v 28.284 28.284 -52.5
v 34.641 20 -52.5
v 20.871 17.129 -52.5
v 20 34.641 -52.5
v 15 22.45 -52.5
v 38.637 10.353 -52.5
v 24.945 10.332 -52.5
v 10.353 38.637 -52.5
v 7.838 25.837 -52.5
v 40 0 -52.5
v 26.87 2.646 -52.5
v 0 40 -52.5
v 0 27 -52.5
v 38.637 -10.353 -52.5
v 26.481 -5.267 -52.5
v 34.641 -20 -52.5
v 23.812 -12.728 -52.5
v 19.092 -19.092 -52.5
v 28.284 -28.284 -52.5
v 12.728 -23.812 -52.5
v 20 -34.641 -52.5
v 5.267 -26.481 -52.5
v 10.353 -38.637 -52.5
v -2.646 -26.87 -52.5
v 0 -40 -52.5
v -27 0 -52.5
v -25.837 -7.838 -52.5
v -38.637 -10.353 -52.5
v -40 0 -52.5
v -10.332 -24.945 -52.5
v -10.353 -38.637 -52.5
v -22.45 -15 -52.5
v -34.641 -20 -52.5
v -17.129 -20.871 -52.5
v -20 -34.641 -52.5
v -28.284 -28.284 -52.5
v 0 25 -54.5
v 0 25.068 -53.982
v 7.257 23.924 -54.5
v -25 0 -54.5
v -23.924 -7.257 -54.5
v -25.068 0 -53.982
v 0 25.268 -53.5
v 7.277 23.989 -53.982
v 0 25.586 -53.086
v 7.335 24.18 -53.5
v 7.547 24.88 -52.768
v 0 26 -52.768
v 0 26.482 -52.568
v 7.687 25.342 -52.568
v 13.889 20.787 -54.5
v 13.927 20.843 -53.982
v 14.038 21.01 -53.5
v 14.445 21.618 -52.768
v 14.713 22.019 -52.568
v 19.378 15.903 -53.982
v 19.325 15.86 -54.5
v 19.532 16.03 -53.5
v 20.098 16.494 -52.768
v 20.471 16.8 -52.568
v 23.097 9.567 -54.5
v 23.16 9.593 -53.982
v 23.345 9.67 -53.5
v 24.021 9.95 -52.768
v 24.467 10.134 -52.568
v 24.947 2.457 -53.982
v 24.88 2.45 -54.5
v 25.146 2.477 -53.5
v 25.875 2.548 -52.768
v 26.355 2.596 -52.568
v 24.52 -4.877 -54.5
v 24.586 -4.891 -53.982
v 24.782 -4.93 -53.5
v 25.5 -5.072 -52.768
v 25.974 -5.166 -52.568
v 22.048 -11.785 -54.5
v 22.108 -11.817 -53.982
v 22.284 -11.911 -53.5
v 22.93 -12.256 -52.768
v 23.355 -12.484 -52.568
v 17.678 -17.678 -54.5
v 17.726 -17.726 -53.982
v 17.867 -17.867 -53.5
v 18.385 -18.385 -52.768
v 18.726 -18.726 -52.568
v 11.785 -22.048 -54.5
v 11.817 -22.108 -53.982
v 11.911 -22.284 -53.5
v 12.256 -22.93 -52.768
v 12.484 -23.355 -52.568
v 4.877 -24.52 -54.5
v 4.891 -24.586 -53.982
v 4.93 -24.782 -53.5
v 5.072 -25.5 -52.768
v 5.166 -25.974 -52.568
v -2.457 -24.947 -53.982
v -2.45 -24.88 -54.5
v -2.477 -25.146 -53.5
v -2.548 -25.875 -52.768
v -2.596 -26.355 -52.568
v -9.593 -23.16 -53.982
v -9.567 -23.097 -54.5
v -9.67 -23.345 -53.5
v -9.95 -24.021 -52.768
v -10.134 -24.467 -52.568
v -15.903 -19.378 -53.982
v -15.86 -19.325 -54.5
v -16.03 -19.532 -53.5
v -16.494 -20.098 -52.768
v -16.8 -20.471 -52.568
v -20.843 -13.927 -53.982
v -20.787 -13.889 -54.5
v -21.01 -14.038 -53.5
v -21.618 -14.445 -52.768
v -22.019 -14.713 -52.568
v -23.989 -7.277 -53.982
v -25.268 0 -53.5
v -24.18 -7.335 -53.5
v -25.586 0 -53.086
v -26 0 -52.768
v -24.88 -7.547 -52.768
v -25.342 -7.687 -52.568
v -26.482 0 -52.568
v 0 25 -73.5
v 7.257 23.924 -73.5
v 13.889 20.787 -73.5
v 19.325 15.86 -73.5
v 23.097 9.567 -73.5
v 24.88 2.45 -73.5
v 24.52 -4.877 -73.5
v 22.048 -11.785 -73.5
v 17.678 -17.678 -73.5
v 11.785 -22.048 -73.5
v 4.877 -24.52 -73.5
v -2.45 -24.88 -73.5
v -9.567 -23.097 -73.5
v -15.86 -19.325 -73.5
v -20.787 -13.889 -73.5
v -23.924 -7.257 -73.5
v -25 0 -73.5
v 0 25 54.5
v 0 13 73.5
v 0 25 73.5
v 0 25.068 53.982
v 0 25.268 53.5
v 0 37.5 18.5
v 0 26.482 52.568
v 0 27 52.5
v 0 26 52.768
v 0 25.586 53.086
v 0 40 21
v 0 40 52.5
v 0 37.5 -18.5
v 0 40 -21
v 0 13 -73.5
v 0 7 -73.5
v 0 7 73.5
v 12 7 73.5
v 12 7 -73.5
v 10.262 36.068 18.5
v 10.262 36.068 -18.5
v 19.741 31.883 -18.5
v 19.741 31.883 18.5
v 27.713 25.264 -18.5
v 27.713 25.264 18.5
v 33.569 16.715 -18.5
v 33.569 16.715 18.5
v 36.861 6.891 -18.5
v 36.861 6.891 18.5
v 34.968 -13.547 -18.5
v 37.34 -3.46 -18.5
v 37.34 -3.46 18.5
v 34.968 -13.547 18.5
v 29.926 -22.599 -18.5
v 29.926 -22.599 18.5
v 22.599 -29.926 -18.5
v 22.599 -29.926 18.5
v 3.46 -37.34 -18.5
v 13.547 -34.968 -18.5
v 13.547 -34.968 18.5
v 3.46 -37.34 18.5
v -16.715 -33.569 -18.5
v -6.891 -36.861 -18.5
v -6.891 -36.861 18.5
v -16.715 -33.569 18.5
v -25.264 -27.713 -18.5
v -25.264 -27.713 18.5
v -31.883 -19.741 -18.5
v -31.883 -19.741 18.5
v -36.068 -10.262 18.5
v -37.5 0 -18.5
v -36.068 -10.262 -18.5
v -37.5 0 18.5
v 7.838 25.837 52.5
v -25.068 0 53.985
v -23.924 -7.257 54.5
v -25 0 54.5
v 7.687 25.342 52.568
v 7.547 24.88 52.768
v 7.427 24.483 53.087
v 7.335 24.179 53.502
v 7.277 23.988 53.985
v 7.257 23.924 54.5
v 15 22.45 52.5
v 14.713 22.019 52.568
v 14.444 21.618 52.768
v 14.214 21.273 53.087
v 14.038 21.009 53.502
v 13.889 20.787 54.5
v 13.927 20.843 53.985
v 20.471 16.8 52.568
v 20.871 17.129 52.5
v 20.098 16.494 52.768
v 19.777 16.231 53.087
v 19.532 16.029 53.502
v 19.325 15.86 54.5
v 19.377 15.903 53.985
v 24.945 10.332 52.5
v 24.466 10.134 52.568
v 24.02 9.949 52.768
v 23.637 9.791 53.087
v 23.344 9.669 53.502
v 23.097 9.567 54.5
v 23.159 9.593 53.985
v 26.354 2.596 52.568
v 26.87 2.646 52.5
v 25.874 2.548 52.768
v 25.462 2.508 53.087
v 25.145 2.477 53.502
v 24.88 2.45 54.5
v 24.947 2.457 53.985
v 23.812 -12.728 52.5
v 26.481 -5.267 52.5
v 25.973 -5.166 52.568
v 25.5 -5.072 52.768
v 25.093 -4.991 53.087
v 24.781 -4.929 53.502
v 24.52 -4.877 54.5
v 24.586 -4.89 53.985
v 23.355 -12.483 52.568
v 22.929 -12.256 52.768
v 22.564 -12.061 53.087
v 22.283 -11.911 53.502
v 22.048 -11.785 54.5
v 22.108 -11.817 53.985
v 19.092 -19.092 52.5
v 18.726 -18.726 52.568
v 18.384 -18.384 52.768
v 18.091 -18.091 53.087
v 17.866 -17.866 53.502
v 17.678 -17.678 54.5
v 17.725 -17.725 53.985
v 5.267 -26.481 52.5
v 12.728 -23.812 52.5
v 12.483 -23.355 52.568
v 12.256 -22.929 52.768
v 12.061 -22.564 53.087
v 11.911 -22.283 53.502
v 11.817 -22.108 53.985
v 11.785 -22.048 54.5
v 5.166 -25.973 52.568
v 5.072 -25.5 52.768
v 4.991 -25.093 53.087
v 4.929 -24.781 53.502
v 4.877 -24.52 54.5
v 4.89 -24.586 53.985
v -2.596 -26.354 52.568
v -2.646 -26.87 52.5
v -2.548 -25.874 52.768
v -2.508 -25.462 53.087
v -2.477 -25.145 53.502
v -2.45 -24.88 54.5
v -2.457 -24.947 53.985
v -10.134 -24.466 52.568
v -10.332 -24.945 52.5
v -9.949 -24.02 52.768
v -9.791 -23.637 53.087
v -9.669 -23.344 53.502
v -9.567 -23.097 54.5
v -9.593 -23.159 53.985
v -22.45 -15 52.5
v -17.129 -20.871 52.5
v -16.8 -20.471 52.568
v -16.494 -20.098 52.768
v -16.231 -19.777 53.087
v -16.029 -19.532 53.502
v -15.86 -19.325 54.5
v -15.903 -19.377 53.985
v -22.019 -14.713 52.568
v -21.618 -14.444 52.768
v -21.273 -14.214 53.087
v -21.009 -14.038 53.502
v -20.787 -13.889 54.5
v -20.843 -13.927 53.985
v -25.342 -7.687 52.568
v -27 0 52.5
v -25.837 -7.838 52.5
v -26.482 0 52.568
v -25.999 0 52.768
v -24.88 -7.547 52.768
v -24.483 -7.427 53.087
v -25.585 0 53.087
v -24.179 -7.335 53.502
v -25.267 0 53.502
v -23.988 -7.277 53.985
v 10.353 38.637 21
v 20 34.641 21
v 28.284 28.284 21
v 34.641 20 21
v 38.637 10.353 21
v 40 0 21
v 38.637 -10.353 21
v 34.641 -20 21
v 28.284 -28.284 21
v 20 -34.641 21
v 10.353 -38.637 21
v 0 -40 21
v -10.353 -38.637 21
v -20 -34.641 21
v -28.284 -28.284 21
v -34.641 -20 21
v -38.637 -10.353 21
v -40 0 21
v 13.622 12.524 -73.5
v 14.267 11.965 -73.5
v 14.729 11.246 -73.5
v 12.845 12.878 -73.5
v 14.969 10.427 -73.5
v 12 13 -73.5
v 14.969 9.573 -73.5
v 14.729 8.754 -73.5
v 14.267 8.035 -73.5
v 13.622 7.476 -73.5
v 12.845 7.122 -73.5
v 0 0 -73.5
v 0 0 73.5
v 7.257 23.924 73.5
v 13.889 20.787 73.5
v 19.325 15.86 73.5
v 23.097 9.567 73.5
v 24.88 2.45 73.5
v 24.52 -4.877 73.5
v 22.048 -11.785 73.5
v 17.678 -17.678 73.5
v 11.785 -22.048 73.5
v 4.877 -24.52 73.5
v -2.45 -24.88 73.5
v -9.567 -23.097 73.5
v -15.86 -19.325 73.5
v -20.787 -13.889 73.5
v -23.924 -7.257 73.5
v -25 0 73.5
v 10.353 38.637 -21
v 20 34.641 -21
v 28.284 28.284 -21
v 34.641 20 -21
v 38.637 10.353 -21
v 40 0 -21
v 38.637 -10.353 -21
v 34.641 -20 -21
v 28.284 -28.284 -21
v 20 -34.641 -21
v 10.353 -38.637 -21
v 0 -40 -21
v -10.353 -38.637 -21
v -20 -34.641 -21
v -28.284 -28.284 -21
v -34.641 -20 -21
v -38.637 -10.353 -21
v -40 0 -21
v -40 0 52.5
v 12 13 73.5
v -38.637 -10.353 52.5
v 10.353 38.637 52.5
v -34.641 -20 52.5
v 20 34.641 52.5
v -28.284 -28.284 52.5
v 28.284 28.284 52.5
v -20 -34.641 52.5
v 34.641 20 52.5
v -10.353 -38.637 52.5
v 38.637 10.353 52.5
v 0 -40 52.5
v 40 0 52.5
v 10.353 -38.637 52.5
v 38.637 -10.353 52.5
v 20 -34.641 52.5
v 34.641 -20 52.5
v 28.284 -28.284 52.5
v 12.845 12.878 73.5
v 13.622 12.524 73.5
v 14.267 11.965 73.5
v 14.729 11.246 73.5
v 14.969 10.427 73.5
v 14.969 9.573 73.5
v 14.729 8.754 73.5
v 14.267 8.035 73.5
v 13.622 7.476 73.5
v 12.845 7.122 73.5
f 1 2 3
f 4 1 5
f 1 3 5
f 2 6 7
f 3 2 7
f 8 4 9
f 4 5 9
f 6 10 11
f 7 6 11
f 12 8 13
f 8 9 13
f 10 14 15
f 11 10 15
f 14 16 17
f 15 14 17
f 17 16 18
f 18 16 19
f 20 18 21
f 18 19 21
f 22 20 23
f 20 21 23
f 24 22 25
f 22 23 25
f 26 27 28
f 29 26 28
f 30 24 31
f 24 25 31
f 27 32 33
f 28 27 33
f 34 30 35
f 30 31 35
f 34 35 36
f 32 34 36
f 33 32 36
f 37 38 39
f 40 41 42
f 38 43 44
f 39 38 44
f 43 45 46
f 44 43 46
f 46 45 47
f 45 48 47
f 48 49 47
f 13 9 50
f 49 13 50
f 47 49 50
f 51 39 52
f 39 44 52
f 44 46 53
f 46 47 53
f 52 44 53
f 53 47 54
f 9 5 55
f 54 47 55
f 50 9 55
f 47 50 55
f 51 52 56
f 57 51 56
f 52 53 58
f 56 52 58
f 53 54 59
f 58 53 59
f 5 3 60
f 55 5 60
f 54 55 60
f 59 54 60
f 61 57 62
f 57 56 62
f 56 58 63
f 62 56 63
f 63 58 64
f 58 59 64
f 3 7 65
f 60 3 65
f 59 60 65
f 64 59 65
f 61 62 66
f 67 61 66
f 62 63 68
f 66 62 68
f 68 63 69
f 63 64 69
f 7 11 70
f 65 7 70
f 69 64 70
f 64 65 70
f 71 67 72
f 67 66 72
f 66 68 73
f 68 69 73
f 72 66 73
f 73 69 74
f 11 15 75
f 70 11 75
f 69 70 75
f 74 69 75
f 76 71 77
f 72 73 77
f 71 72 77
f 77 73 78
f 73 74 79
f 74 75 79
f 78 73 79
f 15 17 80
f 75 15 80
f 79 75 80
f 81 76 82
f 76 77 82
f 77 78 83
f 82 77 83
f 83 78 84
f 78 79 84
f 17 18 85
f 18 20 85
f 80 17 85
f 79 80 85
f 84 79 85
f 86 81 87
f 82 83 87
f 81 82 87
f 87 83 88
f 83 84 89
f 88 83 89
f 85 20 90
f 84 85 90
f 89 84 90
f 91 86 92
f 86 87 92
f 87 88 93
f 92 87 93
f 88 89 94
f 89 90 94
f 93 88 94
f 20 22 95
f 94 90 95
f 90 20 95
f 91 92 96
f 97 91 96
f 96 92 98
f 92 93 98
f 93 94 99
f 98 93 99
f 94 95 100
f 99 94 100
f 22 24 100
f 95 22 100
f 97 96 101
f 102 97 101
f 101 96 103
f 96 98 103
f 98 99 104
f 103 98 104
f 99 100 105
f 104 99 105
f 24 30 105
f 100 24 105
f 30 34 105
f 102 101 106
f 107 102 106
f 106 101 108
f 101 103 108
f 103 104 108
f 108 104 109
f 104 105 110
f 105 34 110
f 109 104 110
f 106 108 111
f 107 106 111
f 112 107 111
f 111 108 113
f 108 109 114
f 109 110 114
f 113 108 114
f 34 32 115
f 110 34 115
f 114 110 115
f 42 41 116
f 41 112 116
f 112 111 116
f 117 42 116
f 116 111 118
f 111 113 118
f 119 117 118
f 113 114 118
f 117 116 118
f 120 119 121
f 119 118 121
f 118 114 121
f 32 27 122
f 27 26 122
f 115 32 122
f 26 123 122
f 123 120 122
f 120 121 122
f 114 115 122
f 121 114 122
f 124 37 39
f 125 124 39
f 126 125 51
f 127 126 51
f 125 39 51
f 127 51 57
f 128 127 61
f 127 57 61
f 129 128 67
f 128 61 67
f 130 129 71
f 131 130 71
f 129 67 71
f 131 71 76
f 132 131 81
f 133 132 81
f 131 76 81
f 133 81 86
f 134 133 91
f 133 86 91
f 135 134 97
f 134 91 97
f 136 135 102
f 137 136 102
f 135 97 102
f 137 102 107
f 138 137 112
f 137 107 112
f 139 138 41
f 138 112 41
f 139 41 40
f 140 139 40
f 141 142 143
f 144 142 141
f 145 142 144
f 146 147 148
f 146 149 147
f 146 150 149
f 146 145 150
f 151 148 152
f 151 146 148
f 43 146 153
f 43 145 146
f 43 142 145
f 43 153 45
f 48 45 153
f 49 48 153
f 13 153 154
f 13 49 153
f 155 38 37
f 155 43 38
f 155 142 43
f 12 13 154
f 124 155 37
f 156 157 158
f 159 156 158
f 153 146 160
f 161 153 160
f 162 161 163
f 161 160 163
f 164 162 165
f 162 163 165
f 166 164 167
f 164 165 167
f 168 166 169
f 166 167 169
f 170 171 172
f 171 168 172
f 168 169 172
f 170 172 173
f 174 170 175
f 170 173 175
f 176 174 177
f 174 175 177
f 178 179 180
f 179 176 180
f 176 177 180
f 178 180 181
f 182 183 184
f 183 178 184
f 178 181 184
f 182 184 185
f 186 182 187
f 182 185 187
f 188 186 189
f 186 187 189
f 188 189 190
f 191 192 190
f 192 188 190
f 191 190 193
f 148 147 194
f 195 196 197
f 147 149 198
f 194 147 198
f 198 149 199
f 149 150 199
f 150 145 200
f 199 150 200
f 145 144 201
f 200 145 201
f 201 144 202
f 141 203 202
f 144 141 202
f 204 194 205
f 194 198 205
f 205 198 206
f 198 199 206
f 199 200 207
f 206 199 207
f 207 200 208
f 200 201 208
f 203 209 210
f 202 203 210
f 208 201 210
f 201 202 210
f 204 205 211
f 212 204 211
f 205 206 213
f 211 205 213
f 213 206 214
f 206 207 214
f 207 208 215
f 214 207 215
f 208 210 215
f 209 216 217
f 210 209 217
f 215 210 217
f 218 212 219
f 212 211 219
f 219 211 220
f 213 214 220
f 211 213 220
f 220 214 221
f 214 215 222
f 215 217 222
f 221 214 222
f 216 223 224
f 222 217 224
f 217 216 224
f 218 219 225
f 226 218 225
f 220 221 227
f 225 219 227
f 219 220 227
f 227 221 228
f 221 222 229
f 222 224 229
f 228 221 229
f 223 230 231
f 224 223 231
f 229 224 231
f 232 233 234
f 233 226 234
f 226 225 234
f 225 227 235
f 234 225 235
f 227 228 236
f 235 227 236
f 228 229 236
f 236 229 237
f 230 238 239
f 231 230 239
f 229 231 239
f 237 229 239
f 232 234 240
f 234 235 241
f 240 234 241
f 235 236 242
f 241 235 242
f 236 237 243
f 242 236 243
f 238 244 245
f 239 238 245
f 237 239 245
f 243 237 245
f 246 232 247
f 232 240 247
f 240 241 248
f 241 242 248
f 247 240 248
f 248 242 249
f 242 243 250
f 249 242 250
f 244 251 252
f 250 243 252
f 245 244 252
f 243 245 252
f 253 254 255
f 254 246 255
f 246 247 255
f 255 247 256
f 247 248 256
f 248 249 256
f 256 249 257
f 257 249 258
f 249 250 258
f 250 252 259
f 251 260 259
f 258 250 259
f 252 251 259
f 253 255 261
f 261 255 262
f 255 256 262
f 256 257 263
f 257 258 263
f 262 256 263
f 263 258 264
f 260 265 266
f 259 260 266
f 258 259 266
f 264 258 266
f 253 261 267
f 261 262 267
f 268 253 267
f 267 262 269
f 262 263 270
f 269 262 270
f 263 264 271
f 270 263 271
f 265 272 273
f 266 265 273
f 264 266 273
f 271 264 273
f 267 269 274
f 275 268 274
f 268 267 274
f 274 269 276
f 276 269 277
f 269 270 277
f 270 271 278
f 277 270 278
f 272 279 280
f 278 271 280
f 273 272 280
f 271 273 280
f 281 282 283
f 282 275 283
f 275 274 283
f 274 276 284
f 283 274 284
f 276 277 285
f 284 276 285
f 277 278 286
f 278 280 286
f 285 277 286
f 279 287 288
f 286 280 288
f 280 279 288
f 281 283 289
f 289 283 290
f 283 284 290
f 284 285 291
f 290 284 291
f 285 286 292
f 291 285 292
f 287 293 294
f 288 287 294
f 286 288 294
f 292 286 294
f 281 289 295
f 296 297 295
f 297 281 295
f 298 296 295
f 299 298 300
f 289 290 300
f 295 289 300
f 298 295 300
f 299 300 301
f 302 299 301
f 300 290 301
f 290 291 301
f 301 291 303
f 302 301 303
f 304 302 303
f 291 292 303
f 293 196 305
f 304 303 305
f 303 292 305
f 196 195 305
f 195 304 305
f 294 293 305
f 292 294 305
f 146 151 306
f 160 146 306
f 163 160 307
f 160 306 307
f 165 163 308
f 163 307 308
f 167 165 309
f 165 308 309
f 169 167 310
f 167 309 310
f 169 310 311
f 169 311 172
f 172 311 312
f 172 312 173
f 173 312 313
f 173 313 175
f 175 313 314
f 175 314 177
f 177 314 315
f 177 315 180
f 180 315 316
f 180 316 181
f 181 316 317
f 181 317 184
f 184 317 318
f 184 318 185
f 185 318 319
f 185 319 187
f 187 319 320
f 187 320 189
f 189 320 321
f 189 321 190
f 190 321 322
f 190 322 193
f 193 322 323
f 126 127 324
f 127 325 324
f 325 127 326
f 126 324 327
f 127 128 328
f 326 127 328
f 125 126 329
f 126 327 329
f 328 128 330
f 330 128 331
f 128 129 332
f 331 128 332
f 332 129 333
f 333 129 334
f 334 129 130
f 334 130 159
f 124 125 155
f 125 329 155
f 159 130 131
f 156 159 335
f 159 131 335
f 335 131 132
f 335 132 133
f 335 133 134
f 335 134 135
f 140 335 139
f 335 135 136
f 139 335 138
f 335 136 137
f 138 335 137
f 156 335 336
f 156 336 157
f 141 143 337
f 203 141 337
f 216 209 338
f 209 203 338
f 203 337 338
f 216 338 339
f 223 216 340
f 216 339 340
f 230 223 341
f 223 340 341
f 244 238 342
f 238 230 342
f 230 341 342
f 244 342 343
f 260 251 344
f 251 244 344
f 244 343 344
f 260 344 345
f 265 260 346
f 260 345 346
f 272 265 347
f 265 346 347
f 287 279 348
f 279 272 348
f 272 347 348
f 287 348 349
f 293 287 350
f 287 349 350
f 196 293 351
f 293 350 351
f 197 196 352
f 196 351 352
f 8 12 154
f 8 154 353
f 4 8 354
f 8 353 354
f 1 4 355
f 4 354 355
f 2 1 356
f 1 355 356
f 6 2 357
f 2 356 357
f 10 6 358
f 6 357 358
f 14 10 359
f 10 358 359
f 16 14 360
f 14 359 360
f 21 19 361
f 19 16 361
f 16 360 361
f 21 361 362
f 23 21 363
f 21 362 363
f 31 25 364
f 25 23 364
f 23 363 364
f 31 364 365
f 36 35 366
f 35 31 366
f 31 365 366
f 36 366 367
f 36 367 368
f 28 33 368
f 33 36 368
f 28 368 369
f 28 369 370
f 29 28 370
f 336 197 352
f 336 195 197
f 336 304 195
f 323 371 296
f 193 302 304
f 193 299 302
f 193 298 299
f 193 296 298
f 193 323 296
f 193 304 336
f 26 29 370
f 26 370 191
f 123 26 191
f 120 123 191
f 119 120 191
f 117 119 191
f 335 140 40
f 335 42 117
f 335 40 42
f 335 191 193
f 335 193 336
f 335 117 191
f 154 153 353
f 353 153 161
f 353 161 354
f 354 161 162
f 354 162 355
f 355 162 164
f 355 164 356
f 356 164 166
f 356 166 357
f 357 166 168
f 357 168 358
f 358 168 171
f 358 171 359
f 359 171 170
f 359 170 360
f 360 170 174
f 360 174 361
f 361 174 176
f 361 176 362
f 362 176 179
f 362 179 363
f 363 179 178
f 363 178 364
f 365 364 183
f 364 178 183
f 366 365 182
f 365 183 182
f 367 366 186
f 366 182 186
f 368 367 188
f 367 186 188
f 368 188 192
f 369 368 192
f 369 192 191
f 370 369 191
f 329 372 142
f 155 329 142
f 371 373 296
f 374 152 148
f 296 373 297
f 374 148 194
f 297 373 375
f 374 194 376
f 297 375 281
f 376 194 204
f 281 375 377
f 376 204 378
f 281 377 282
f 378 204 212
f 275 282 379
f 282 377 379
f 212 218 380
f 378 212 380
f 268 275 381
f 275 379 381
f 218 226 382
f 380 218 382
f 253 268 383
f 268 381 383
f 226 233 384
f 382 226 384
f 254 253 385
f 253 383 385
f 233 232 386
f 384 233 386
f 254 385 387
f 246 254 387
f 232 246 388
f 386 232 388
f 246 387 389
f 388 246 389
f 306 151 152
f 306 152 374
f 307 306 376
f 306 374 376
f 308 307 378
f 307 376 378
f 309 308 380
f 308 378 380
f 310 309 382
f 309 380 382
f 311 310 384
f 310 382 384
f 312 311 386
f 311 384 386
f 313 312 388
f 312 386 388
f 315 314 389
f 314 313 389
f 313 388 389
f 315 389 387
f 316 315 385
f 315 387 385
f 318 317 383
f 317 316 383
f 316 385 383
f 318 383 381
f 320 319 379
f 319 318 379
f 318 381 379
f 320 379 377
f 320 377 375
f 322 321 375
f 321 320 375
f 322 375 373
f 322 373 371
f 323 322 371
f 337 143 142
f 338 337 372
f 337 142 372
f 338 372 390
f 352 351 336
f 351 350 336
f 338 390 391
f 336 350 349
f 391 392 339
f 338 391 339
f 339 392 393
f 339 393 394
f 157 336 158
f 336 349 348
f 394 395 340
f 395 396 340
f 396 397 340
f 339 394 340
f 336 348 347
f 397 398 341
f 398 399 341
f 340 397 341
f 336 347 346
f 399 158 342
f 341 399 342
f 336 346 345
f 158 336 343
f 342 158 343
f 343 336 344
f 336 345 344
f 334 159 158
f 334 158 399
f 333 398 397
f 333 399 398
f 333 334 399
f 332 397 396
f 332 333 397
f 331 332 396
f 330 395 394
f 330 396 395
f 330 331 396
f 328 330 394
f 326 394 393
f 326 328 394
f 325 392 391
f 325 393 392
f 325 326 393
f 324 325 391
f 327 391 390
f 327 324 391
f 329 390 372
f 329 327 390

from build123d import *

# Parameters (mm, degrees)
ENL_V_MAT_EXTRU_1_DEPTH      = 93.748315349
ENL_V_MAT_EXTRU_1_DEPTH_BACK = 93.748315349
ESQUISSE3_W                  = 49.590285902
ESQUISSE3_H                  = 55.327856271
ENL_V_MAT_EXTRU_2_DEPTH      = 93.748315349
ENL_V_MAT_EXTRU_2_DEPTH_BACK = 93.748315349


with BuildPart() as part:
    # Esquisse1 → Révolution1 (revolve)
    with BuildSketch(Plane(origin=(0, 0, 0), x_dir=(0, 0, -1), z_dir=(1, 0, 0)), mode=Mode.PRIVATE) as r_volution1_sk:
        with BuildLine():
            Line((-73.5, 0), (73.5, 0))
            Line((73.5, 0), (73.5, 25))
            Line((73.5, 25), (54.5, 25))
            ThreePointArc((54.5, 25), (53.085786438, 25.585786438), (52.5, 27))
            Line((52.5, 27), (52.5, 40))
            Line((52.5, 40), (21, 40))
            Line((21, 40), (18.5, 37.5))
            Line((18.5, 37.5), (-18.5, 37.5))
            Line((-18.5, 37.5), (-21, 40))
            Line((-21, 40), (-52.5, 40))
            Line((-52.5, 40), (-52.5, 27))
            ThreePointArc((-52.5, 27), (-53.085786438, 25.585786438), (-54.5, 25))
            Line((-54.5, 25), (-73.5, 25))
            Line((-73.5, 25), (-73.5, 0))
        make_face()
    revolve(r_volution1_sk.sketch.rotate(Axis((0, 0, 73.5), (0, 0, -1)), 90), axis=Axis((0, 0, 73.5), (0, 0, -1)))

    # Esquisse3 → Enlèv. mat.-Extru.1 (cut, two sides: drawn at the far end of the back side and taken through both)
    with BuildSketch(Plane.XY.offset(-ENL_V_MAT_EXTRU_1_DEPTH_BACK)):
        with Locations((-24.795142951, 27.663928136)):
            Rectangle(ESQUISSE3_W, ESQUISSE3_H)
    extrude(amount=ENL_V_MAT_EXTRU_1_DEPTH + ENL_V_MAT_EXTRU_1_DEPTH_BACK, mode=Mode.SUBTRACT)

    # Esquisse4 → Enlèv. mat.-Extru.2 (cut, two sides: drawn at the far end of the back side and taken through both)
    with BuildSketch(Plane.XY.offset(-ENL_V_MAT_EXTRU_2_DEPTH_BACK)):
        with BuildLine():
            Line((0, 7), (12, 7))
            ThreePointArc((12, 7), (15, 10), (12, 13))
            Line((12, 13), (0, 13))
            Line((0, 13), (0, 7))
        make_face()
    extrude(amount=ENL_V_MAT_EXTRU_2_DEPTH + ENL_V_MAT_EXTRU_2_DEPTH_BACK, mode=Mode.SUBTRACT)


solid = part.part
